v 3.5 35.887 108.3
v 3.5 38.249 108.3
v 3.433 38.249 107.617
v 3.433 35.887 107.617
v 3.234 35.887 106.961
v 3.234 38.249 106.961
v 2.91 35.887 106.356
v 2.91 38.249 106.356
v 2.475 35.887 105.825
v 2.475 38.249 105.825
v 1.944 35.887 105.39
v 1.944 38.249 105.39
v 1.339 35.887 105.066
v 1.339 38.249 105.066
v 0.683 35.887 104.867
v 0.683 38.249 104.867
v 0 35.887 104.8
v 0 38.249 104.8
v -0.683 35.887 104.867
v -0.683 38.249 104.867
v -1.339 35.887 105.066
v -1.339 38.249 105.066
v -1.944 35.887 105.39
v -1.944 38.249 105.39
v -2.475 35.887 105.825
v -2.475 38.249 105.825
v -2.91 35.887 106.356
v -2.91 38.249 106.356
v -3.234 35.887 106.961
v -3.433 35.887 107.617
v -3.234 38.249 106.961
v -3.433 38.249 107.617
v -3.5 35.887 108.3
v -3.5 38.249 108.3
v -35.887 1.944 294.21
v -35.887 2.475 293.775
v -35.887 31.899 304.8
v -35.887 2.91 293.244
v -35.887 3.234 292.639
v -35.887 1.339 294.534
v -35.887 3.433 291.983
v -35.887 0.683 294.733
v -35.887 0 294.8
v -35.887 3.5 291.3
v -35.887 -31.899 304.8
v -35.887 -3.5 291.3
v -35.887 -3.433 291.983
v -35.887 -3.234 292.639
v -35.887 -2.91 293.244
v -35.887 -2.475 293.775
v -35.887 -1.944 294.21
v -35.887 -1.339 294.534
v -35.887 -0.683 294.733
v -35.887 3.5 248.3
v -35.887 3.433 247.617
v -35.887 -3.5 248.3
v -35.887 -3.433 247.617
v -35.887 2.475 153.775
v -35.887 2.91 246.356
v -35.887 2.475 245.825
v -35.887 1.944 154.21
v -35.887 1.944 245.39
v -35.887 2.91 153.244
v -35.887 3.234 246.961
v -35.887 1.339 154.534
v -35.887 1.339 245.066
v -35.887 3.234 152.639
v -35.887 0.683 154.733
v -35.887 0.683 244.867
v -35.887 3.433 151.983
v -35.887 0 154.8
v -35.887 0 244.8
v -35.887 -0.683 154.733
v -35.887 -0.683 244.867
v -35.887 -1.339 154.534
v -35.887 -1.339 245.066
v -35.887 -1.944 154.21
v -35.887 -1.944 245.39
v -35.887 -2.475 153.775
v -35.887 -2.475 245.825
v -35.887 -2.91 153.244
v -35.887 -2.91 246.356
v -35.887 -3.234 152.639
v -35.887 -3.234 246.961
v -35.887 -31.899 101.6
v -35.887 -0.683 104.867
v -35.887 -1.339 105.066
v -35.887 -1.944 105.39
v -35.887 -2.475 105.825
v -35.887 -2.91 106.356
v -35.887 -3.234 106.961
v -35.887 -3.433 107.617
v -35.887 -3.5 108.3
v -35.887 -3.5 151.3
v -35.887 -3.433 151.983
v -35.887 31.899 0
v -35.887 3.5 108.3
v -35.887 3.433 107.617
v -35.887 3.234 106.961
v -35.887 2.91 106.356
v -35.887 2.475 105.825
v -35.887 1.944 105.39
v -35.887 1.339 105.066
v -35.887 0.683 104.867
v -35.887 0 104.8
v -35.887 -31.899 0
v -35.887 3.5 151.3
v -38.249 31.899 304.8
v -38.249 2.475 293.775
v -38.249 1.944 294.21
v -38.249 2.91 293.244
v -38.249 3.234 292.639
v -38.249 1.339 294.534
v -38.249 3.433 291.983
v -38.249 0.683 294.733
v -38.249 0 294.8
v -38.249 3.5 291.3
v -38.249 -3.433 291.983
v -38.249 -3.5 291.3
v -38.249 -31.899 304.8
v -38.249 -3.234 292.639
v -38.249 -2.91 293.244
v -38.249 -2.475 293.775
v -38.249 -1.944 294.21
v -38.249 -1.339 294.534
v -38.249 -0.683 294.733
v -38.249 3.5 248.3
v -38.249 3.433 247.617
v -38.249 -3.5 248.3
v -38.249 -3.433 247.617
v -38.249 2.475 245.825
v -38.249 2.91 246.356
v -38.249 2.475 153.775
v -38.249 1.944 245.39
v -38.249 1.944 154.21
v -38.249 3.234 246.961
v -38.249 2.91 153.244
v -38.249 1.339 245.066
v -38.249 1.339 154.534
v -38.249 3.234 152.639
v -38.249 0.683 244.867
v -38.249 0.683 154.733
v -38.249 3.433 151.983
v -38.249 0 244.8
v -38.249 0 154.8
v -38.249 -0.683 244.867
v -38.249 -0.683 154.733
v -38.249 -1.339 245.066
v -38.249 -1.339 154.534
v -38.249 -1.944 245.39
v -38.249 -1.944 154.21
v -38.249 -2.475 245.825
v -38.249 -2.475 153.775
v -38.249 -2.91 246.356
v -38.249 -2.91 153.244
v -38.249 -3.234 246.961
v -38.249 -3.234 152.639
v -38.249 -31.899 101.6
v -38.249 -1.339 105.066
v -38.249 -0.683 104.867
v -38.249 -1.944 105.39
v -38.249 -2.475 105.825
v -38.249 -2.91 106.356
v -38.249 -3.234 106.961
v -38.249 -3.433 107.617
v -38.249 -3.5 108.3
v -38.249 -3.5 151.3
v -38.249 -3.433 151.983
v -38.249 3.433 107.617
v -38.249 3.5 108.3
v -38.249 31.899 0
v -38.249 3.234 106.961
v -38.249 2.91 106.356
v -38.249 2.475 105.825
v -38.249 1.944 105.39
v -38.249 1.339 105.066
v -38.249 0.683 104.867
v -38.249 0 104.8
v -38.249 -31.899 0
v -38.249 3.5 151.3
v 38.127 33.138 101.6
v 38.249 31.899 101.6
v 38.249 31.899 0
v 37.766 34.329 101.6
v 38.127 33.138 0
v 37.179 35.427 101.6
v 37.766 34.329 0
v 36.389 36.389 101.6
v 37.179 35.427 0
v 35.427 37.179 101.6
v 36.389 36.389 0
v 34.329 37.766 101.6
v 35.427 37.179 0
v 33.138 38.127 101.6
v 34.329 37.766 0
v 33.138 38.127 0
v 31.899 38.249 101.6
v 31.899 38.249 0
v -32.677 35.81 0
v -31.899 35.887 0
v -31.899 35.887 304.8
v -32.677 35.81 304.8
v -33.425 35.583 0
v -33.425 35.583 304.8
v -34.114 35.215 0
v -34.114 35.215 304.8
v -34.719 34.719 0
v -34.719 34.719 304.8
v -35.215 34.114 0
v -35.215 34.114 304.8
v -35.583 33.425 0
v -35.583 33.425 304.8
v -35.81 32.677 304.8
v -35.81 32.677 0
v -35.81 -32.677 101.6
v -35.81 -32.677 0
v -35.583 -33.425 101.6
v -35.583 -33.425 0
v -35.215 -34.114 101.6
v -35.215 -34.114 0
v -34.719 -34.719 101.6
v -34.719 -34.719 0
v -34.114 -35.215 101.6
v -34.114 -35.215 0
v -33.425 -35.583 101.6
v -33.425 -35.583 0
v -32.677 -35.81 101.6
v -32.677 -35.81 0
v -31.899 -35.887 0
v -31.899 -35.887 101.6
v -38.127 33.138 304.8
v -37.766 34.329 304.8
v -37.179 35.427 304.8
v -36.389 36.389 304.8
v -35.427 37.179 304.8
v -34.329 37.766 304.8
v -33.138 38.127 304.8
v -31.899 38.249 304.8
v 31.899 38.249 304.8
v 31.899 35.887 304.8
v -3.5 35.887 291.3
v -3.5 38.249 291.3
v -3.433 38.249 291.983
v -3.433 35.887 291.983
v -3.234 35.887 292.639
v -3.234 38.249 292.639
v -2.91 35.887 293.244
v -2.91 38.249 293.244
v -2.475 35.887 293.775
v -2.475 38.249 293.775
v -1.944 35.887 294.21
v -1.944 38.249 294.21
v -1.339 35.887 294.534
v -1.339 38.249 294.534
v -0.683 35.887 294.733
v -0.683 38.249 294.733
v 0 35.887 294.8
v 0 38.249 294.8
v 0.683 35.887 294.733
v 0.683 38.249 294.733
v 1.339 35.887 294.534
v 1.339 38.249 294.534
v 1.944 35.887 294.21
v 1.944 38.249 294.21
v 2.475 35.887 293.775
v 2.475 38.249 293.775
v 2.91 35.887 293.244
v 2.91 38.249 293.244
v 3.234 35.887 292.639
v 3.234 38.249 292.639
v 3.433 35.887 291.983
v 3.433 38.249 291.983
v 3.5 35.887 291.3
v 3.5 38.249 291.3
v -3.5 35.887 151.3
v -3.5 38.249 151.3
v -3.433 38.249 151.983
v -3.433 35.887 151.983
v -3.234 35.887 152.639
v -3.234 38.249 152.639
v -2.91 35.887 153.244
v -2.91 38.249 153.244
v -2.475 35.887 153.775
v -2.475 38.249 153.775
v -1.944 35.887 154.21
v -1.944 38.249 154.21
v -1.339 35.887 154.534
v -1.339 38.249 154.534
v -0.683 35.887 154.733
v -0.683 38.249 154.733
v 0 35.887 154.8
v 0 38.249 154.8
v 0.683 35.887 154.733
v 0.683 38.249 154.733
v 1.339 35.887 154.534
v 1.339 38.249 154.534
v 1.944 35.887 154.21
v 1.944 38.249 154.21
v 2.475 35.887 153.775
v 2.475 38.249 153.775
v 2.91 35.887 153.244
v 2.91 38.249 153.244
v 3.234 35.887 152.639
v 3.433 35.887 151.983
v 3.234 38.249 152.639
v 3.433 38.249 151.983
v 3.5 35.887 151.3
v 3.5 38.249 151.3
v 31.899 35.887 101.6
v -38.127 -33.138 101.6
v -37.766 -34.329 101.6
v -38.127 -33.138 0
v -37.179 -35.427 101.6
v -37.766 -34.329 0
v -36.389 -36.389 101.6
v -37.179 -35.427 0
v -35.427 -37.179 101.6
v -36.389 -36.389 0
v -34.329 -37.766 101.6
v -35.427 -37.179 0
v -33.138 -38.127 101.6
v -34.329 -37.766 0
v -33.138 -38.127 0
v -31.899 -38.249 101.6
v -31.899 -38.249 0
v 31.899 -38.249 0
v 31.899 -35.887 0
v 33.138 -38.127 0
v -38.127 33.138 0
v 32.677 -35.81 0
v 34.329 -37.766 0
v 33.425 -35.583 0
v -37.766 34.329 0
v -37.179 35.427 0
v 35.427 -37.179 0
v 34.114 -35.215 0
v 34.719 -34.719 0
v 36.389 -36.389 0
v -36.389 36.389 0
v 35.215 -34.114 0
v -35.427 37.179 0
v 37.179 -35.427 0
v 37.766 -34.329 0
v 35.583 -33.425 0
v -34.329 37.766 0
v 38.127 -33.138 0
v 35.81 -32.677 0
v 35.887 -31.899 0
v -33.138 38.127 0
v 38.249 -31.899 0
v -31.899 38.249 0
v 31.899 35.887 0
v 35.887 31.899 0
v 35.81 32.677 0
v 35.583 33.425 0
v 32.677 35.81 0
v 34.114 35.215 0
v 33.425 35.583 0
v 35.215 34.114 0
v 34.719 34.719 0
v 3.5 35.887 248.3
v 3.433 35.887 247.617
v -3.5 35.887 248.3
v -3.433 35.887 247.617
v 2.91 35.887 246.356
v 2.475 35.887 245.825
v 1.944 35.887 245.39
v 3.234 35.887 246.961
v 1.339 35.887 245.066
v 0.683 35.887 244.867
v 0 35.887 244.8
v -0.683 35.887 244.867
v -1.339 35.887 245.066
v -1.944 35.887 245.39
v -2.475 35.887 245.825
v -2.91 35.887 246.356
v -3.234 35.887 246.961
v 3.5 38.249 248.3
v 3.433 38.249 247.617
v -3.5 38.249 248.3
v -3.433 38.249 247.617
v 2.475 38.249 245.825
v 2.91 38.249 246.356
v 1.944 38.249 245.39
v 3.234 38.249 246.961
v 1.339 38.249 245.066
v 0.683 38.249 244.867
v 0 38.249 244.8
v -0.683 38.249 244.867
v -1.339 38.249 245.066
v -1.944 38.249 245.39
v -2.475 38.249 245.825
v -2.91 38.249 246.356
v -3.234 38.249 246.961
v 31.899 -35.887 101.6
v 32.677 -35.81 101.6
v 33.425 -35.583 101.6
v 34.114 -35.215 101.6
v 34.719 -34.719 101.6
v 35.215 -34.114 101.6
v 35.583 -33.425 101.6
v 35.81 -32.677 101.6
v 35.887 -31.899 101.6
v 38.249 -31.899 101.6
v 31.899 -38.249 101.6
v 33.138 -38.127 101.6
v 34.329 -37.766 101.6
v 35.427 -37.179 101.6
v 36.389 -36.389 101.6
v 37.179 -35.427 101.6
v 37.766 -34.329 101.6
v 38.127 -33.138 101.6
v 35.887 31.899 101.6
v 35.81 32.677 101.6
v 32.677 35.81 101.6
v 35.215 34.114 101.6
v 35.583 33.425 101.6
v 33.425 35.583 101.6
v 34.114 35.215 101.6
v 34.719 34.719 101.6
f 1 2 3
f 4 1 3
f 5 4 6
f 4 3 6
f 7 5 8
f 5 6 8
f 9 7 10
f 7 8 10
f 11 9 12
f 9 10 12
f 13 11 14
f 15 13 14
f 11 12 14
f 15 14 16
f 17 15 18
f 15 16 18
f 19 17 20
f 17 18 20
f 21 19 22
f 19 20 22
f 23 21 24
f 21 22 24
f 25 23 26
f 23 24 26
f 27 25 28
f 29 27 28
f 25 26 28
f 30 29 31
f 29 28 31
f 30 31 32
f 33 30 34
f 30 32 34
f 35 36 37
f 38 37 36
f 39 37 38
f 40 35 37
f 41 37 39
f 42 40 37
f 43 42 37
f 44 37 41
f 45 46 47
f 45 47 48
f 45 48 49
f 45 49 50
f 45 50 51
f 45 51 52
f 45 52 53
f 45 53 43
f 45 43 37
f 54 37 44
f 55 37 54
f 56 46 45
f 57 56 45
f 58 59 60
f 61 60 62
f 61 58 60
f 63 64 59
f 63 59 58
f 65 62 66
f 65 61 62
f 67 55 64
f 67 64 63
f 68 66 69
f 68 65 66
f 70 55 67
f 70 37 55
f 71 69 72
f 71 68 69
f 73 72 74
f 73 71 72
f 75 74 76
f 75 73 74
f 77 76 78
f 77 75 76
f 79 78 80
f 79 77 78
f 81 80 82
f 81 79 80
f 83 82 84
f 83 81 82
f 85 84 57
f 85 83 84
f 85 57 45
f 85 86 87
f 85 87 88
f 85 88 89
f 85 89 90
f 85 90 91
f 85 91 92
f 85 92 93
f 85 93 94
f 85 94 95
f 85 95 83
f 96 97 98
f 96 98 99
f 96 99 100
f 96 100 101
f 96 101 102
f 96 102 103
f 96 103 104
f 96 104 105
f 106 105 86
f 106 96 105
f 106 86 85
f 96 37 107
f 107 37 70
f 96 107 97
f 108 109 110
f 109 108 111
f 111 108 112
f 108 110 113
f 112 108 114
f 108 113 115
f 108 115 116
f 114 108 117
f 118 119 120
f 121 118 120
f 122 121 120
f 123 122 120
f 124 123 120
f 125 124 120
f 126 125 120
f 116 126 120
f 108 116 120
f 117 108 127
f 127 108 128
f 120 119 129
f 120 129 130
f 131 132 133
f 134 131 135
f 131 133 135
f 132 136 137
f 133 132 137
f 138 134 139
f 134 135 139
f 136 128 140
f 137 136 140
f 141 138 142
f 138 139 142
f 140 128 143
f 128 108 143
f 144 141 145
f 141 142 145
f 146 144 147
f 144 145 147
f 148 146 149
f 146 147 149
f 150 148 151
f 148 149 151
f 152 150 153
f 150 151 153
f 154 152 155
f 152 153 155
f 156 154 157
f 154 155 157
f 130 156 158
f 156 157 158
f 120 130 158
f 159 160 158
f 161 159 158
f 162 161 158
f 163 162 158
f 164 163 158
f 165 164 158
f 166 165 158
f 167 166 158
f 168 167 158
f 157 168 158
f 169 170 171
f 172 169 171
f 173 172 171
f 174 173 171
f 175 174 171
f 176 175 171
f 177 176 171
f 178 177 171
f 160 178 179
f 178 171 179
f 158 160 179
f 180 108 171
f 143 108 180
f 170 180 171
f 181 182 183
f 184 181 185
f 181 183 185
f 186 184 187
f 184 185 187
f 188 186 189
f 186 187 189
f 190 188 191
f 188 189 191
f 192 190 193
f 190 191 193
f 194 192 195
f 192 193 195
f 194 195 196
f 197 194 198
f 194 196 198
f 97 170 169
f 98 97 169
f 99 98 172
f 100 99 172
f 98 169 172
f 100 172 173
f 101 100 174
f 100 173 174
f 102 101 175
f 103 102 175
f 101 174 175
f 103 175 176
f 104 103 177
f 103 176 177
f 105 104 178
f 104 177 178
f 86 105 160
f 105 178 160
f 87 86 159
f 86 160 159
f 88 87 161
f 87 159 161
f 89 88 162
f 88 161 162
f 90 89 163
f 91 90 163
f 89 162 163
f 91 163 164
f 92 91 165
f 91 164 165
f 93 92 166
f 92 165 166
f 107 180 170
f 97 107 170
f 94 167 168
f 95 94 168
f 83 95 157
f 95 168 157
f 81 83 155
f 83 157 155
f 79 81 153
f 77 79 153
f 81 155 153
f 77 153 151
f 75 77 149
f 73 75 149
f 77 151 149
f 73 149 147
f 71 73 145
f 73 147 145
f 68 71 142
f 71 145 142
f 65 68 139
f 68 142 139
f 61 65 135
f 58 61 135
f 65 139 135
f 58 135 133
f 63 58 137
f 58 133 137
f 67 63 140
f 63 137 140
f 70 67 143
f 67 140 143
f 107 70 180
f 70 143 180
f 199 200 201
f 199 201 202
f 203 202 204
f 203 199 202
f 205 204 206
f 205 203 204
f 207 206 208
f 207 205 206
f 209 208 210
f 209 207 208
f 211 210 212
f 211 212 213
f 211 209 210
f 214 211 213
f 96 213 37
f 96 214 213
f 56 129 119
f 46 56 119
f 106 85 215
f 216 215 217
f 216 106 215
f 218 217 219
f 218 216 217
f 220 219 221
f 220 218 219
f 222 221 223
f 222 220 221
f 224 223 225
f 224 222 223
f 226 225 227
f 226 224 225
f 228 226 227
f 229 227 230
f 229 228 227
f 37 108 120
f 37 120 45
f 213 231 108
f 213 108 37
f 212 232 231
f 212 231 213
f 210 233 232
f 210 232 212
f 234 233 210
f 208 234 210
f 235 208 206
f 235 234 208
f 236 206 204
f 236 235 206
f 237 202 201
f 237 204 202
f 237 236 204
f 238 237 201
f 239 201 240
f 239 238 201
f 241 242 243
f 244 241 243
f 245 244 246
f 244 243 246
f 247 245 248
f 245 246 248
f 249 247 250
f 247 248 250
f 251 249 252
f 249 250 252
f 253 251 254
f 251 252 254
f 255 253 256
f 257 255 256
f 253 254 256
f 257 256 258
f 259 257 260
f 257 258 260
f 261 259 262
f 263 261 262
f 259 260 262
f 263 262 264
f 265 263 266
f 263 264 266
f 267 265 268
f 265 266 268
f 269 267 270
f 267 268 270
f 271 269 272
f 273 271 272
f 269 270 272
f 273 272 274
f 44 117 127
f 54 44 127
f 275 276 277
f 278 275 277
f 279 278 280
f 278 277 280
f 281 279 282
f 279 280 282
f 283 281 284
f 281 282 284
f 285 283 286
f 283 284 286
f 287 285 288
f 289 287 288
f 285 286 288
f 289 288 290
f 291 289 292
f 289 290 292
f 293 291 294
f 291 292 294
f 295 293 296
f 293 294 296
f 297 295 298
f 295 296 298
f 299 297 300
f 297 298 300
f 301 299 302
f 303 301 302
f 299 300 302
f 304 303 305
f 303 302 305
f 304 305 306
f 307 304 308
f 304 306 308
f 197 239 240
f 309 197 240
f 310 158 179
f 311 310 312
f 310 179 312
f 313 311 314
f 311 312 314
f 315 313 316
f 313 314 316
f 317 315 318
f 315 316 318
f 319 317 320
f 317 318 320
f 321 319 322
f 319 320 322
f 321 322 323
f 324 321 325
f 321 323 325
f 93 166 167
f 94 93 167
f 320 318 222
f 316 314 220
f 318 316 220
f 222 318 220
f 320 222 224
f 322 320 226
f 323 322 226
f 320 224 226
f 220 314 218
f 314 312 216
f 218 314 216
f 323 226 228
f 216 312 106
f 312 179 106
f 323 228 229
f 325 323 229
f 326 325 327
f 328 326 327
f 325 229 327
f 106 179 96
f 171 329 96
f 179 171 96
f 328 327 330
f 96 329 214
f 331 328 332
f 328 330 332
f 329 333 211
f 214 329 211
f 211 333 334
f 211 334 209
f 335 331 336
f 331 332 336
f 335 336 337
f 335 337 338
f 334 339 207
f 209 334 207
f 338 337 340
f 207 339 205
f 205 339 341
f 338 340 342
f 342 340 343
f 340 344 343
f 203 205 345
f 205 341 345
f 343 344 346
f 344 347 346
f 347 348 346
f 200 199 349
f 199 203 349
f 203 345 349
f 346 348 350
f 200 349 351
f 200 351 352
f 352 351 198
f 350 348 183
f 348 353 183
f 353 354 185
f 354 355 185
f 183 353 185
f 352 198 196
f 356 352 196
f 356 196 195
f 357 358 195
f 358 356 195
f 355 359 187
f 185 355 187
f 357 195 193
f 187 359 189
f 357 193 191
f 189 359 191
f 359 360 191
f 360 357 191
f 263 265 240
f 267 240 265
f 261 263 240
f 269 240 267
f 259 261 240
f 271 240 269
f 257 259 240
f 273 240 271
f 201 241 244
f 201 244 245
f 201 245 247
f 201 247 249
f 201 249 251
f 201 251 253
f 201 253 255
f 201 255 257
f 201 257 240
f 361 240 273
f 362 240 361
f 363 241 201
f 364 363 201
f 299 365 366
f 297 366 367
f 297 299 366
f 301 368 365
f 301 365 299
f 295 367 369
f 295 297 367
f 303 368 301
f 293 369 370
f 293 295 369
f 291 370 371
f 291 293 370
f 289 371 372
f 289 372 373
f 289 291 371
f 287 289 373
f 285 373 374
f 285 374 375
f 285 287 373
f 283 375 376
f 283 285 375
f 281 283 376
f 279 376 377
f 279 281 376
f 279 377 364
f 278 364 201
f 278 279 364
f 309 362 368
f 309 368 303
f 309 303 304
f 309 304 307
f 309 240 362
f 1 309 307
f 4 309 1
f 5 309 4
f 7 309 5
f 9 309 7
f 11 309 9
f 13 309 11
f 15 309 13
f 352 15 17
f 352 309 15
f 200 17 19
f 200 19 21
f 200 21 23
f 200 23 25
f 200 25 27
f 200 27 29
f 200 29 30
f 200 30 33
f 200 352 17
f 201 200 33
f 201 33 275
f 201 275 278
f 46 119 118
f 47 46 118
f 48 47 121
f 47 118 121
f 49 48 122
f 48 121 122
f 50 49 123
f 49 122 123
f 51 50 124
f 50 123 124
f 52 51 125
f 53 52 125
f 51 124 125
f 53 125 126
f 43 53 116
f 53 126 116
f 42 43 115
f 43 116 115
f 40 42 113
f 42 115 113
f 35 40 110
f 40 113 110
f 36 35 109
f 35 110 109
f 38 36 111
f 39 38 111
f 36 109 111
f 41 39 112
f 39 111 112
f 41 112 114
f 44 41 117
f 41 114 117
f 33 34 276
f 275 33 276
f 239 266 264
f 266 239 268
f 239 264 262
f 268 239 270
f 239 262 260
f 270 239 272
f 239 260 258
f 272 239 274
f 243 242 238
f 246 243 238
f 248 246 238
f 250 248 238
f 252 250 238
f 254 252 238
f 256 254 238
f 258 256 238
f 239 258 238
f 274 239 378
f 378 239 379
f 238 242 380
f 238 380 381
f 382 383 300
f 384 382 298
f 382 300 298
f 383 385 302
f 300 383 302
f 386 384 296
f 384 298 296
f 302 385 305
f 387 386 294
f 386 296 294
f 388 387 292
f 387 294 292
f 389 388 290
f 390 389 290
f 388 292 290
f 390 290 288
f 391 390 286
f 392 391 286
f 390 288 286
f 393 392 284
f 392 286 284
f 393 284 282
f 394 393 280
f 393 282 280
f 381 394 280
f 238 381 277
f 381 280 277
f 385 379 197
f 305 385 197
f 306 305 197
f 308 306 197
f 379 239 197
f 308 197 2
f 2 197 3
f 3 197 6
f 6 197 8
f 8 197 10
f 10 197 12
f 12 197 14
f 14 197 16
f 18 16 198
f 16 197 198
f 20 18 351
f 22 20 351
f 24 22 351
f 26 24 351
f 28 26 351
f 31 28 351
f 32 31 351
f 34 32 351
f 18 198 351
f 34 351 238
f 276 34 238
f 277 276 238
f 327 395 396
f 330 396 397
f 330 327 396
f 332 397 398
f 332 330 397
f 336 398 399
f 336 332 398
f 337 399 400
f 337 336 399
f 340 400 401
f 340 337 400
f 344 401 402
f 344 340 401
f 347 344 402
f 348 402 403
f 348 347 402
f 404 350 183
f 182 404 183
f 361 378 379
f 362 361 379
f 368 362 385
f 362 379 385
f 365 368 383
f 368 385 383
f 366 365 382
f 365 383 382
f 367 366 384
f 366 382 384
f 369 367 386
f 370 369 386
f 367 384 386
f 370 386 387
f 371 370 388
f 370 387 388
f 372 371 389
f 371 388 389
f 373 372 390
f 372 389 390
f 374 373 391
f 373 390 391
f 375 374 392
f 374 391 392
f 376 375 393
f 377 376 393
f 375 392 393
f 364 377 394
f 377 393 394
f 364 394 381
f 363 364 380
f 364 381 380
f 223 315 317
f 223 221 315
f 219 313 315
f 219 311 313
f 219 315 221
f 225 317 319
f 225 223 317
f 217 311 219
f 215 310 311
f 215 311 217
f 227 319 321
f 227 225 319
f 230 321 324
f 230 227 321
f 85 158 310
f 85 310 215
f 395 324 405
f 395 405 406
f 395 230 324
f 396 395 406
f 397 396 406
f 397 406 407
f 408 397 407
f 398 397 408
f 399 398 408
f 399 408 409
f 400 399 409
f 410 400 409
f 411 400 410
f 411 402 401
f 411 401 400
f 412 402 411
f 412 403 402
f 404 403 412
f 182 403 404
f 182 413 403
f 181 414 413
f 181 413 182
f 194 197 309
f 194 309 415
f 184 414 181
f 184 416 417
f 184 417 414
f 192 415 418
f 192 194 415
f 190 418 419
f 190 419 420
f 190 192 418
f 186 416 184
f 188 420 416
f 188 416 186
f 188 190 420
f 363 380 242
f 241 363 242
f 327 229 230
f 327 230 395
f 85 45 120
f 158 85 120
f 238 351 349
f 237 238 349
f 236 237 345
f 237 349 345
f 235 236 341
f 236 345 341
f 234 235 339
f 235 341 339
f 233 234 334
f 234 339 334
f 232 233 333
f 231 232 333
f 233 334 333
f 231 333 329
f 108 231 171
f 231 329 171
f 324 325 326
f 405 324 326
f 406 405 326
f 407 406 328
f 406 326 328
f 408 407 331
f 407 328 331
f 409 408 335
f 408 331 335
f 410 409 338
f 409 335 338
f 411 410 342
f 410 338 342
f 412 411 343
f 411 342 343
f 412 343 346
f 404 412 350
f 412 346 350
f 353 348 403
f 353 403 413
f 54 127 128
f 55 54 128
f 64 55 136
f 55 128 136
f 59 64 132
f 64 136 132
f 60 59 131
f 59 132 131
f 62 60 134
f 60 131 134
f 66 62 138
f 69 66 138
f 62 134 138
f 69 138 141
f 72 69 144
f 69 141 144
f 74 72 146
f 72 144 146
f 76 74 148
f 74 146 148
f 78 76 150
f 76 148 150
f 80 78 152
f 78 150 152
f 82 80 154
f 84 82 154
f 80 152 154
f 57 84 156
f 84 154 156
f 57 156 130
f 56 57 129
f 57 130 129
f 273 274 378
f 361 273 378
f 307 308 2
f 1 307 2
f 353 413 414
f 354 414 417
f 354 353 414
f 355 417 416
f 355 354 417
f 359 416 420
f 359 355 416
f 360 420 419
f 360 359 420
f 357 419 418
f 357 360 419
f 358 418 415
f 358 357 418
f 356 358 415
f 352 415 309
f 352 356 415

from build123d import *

# Parameters (mm, degrees)
F1_DEPTH = 304.8
F2_T     = -2.3622
F4_DEPTH = 203.2
F6_DEPTH = 76.498957
F8_DEPTH = 76.498957


with BuildPart() as f1:
    # F0 (on Top) → F1 (new body)
    with BuildSketch(Plane.XY):
        with BuildLine():
            Line((-31.898979, -38.248979), (31.898979, -38.248979))
            ThreePointArc((31.898979, -38.248979), (36.389107, -36.389107), (38.248979, -31.898979))
            Line((38.248979, -31.898979), (38.248979, 31.898979))
            ThreePointArc((38.248979, 31.898979), (36.389107, 36.389107), (31.898979, 38.248979))
            Line((31.898979, 38.248979), (-31.898979, 38.248979))
            ThreePointArc((-31.898979, 38.248979), (-36.389107, 36.389107), (-38.248979, 31.898979))
            Line((-38.248979, 31.898979), (-38.248979, -31.898979))
            ThreePointArc((-38.248979, -31.898979), (-36.389107, -36.389107), (-31.898979, -38.248979))
        make_face()
    extrude(amount=F1_DEPTH)

    # F2
    f2_openings = [f1.faces().sort_by_distance(p)[0] for p in [
        (0, 0, 304.8),
        (0, 0, 0),
    ]]
    offset(amount=F2_T, openings=f2_openings)

    # F3 (on face) → F4 (cut)
    with BuildSketch(Plane.XY.offset(304.8)):
        Polygon((-35.886779, -31.898979), (-38.248979, -31.898979), (-38.248979, -60.503662), (63.648979, -60.503662), (63.648979, 38.248979), (31.898979, 38.248979), (31.898979, 35.886779), align=None)
    extrude(amount=-F4_DEPTH, mode=Mode.SUBTRACT)

    # F5 (on face) → F6 (cut, through all)
    with BuildSketch(Plane(origin=(-38.248979, 0, 0), x_dir=(0, -1, 0), z_dir=(-1, 0, 0))):
        with BuildLine():
            ThreePointArc((-3.5, 248.3), (0, 244.8), (3.5, 248.3))
            Line((3.5, 248.3), (3.5, 291.3))
            ThreePointArc((3.5, 291.3), (0, 294.8), (-3.5, 291.3))
            Line((-3.5, 291.3), (-3.5, 248.3))
        make_face()
        with BuildLine():
            ThreePointArc((-3.5, 108.299998), (2e-06, 104.799998), (3.5, 108.300002))
            Line((3.5, 108.300002), (3.5, 151.300002))
            ThreePointArc((3.5, 151.300002), (-2e-06, 154.799998), (-3.5, 151.299998))
            Line((-3.5, 151.299998), (-3.5, 108.299998))
        make_face()
    extrude(amount=-F6_DEPTH, mode=Mode.SUBTRACT)

    # F7 (on face) → F8 (cut, through all)
    with BuildSketch(Plane(origin=(0, 38.248979, 0), x_dir=(-1, 0, 0), z_dir=(0, 1, 0))):
        with BuildLine():
            ThreePointArc((-3.5, 248.300001), (0, 244.800001), (3.5, 248.300001))
            Line((3.5, 248.300001), (3.5, 291.299999))
            ThreePointArc((3.5, 291.299999), (0, 294.800001), (-3.5, 291.299999))
            Line((-3.5, 291.299999), (-3.5, 248.300001))
        make_face()
        with BuildLine():
            ThreePointArc((-3.5, 108.300001), (0, 104.800001), (3.5, 108.300001))
            Line((3.5, 108.300001), (3.5, 151.299999))
            ThreePointArc((3.5, 151.299999), (0, 154.799999), (-3.5, 151.299999))
            Line((-3.5, 151.299999), (-3.5, 108.300001))
        make_face()
    extrude(amount=-F8_DEPTH, mode=Mode.SUBTRACT)


solid = f1.part
